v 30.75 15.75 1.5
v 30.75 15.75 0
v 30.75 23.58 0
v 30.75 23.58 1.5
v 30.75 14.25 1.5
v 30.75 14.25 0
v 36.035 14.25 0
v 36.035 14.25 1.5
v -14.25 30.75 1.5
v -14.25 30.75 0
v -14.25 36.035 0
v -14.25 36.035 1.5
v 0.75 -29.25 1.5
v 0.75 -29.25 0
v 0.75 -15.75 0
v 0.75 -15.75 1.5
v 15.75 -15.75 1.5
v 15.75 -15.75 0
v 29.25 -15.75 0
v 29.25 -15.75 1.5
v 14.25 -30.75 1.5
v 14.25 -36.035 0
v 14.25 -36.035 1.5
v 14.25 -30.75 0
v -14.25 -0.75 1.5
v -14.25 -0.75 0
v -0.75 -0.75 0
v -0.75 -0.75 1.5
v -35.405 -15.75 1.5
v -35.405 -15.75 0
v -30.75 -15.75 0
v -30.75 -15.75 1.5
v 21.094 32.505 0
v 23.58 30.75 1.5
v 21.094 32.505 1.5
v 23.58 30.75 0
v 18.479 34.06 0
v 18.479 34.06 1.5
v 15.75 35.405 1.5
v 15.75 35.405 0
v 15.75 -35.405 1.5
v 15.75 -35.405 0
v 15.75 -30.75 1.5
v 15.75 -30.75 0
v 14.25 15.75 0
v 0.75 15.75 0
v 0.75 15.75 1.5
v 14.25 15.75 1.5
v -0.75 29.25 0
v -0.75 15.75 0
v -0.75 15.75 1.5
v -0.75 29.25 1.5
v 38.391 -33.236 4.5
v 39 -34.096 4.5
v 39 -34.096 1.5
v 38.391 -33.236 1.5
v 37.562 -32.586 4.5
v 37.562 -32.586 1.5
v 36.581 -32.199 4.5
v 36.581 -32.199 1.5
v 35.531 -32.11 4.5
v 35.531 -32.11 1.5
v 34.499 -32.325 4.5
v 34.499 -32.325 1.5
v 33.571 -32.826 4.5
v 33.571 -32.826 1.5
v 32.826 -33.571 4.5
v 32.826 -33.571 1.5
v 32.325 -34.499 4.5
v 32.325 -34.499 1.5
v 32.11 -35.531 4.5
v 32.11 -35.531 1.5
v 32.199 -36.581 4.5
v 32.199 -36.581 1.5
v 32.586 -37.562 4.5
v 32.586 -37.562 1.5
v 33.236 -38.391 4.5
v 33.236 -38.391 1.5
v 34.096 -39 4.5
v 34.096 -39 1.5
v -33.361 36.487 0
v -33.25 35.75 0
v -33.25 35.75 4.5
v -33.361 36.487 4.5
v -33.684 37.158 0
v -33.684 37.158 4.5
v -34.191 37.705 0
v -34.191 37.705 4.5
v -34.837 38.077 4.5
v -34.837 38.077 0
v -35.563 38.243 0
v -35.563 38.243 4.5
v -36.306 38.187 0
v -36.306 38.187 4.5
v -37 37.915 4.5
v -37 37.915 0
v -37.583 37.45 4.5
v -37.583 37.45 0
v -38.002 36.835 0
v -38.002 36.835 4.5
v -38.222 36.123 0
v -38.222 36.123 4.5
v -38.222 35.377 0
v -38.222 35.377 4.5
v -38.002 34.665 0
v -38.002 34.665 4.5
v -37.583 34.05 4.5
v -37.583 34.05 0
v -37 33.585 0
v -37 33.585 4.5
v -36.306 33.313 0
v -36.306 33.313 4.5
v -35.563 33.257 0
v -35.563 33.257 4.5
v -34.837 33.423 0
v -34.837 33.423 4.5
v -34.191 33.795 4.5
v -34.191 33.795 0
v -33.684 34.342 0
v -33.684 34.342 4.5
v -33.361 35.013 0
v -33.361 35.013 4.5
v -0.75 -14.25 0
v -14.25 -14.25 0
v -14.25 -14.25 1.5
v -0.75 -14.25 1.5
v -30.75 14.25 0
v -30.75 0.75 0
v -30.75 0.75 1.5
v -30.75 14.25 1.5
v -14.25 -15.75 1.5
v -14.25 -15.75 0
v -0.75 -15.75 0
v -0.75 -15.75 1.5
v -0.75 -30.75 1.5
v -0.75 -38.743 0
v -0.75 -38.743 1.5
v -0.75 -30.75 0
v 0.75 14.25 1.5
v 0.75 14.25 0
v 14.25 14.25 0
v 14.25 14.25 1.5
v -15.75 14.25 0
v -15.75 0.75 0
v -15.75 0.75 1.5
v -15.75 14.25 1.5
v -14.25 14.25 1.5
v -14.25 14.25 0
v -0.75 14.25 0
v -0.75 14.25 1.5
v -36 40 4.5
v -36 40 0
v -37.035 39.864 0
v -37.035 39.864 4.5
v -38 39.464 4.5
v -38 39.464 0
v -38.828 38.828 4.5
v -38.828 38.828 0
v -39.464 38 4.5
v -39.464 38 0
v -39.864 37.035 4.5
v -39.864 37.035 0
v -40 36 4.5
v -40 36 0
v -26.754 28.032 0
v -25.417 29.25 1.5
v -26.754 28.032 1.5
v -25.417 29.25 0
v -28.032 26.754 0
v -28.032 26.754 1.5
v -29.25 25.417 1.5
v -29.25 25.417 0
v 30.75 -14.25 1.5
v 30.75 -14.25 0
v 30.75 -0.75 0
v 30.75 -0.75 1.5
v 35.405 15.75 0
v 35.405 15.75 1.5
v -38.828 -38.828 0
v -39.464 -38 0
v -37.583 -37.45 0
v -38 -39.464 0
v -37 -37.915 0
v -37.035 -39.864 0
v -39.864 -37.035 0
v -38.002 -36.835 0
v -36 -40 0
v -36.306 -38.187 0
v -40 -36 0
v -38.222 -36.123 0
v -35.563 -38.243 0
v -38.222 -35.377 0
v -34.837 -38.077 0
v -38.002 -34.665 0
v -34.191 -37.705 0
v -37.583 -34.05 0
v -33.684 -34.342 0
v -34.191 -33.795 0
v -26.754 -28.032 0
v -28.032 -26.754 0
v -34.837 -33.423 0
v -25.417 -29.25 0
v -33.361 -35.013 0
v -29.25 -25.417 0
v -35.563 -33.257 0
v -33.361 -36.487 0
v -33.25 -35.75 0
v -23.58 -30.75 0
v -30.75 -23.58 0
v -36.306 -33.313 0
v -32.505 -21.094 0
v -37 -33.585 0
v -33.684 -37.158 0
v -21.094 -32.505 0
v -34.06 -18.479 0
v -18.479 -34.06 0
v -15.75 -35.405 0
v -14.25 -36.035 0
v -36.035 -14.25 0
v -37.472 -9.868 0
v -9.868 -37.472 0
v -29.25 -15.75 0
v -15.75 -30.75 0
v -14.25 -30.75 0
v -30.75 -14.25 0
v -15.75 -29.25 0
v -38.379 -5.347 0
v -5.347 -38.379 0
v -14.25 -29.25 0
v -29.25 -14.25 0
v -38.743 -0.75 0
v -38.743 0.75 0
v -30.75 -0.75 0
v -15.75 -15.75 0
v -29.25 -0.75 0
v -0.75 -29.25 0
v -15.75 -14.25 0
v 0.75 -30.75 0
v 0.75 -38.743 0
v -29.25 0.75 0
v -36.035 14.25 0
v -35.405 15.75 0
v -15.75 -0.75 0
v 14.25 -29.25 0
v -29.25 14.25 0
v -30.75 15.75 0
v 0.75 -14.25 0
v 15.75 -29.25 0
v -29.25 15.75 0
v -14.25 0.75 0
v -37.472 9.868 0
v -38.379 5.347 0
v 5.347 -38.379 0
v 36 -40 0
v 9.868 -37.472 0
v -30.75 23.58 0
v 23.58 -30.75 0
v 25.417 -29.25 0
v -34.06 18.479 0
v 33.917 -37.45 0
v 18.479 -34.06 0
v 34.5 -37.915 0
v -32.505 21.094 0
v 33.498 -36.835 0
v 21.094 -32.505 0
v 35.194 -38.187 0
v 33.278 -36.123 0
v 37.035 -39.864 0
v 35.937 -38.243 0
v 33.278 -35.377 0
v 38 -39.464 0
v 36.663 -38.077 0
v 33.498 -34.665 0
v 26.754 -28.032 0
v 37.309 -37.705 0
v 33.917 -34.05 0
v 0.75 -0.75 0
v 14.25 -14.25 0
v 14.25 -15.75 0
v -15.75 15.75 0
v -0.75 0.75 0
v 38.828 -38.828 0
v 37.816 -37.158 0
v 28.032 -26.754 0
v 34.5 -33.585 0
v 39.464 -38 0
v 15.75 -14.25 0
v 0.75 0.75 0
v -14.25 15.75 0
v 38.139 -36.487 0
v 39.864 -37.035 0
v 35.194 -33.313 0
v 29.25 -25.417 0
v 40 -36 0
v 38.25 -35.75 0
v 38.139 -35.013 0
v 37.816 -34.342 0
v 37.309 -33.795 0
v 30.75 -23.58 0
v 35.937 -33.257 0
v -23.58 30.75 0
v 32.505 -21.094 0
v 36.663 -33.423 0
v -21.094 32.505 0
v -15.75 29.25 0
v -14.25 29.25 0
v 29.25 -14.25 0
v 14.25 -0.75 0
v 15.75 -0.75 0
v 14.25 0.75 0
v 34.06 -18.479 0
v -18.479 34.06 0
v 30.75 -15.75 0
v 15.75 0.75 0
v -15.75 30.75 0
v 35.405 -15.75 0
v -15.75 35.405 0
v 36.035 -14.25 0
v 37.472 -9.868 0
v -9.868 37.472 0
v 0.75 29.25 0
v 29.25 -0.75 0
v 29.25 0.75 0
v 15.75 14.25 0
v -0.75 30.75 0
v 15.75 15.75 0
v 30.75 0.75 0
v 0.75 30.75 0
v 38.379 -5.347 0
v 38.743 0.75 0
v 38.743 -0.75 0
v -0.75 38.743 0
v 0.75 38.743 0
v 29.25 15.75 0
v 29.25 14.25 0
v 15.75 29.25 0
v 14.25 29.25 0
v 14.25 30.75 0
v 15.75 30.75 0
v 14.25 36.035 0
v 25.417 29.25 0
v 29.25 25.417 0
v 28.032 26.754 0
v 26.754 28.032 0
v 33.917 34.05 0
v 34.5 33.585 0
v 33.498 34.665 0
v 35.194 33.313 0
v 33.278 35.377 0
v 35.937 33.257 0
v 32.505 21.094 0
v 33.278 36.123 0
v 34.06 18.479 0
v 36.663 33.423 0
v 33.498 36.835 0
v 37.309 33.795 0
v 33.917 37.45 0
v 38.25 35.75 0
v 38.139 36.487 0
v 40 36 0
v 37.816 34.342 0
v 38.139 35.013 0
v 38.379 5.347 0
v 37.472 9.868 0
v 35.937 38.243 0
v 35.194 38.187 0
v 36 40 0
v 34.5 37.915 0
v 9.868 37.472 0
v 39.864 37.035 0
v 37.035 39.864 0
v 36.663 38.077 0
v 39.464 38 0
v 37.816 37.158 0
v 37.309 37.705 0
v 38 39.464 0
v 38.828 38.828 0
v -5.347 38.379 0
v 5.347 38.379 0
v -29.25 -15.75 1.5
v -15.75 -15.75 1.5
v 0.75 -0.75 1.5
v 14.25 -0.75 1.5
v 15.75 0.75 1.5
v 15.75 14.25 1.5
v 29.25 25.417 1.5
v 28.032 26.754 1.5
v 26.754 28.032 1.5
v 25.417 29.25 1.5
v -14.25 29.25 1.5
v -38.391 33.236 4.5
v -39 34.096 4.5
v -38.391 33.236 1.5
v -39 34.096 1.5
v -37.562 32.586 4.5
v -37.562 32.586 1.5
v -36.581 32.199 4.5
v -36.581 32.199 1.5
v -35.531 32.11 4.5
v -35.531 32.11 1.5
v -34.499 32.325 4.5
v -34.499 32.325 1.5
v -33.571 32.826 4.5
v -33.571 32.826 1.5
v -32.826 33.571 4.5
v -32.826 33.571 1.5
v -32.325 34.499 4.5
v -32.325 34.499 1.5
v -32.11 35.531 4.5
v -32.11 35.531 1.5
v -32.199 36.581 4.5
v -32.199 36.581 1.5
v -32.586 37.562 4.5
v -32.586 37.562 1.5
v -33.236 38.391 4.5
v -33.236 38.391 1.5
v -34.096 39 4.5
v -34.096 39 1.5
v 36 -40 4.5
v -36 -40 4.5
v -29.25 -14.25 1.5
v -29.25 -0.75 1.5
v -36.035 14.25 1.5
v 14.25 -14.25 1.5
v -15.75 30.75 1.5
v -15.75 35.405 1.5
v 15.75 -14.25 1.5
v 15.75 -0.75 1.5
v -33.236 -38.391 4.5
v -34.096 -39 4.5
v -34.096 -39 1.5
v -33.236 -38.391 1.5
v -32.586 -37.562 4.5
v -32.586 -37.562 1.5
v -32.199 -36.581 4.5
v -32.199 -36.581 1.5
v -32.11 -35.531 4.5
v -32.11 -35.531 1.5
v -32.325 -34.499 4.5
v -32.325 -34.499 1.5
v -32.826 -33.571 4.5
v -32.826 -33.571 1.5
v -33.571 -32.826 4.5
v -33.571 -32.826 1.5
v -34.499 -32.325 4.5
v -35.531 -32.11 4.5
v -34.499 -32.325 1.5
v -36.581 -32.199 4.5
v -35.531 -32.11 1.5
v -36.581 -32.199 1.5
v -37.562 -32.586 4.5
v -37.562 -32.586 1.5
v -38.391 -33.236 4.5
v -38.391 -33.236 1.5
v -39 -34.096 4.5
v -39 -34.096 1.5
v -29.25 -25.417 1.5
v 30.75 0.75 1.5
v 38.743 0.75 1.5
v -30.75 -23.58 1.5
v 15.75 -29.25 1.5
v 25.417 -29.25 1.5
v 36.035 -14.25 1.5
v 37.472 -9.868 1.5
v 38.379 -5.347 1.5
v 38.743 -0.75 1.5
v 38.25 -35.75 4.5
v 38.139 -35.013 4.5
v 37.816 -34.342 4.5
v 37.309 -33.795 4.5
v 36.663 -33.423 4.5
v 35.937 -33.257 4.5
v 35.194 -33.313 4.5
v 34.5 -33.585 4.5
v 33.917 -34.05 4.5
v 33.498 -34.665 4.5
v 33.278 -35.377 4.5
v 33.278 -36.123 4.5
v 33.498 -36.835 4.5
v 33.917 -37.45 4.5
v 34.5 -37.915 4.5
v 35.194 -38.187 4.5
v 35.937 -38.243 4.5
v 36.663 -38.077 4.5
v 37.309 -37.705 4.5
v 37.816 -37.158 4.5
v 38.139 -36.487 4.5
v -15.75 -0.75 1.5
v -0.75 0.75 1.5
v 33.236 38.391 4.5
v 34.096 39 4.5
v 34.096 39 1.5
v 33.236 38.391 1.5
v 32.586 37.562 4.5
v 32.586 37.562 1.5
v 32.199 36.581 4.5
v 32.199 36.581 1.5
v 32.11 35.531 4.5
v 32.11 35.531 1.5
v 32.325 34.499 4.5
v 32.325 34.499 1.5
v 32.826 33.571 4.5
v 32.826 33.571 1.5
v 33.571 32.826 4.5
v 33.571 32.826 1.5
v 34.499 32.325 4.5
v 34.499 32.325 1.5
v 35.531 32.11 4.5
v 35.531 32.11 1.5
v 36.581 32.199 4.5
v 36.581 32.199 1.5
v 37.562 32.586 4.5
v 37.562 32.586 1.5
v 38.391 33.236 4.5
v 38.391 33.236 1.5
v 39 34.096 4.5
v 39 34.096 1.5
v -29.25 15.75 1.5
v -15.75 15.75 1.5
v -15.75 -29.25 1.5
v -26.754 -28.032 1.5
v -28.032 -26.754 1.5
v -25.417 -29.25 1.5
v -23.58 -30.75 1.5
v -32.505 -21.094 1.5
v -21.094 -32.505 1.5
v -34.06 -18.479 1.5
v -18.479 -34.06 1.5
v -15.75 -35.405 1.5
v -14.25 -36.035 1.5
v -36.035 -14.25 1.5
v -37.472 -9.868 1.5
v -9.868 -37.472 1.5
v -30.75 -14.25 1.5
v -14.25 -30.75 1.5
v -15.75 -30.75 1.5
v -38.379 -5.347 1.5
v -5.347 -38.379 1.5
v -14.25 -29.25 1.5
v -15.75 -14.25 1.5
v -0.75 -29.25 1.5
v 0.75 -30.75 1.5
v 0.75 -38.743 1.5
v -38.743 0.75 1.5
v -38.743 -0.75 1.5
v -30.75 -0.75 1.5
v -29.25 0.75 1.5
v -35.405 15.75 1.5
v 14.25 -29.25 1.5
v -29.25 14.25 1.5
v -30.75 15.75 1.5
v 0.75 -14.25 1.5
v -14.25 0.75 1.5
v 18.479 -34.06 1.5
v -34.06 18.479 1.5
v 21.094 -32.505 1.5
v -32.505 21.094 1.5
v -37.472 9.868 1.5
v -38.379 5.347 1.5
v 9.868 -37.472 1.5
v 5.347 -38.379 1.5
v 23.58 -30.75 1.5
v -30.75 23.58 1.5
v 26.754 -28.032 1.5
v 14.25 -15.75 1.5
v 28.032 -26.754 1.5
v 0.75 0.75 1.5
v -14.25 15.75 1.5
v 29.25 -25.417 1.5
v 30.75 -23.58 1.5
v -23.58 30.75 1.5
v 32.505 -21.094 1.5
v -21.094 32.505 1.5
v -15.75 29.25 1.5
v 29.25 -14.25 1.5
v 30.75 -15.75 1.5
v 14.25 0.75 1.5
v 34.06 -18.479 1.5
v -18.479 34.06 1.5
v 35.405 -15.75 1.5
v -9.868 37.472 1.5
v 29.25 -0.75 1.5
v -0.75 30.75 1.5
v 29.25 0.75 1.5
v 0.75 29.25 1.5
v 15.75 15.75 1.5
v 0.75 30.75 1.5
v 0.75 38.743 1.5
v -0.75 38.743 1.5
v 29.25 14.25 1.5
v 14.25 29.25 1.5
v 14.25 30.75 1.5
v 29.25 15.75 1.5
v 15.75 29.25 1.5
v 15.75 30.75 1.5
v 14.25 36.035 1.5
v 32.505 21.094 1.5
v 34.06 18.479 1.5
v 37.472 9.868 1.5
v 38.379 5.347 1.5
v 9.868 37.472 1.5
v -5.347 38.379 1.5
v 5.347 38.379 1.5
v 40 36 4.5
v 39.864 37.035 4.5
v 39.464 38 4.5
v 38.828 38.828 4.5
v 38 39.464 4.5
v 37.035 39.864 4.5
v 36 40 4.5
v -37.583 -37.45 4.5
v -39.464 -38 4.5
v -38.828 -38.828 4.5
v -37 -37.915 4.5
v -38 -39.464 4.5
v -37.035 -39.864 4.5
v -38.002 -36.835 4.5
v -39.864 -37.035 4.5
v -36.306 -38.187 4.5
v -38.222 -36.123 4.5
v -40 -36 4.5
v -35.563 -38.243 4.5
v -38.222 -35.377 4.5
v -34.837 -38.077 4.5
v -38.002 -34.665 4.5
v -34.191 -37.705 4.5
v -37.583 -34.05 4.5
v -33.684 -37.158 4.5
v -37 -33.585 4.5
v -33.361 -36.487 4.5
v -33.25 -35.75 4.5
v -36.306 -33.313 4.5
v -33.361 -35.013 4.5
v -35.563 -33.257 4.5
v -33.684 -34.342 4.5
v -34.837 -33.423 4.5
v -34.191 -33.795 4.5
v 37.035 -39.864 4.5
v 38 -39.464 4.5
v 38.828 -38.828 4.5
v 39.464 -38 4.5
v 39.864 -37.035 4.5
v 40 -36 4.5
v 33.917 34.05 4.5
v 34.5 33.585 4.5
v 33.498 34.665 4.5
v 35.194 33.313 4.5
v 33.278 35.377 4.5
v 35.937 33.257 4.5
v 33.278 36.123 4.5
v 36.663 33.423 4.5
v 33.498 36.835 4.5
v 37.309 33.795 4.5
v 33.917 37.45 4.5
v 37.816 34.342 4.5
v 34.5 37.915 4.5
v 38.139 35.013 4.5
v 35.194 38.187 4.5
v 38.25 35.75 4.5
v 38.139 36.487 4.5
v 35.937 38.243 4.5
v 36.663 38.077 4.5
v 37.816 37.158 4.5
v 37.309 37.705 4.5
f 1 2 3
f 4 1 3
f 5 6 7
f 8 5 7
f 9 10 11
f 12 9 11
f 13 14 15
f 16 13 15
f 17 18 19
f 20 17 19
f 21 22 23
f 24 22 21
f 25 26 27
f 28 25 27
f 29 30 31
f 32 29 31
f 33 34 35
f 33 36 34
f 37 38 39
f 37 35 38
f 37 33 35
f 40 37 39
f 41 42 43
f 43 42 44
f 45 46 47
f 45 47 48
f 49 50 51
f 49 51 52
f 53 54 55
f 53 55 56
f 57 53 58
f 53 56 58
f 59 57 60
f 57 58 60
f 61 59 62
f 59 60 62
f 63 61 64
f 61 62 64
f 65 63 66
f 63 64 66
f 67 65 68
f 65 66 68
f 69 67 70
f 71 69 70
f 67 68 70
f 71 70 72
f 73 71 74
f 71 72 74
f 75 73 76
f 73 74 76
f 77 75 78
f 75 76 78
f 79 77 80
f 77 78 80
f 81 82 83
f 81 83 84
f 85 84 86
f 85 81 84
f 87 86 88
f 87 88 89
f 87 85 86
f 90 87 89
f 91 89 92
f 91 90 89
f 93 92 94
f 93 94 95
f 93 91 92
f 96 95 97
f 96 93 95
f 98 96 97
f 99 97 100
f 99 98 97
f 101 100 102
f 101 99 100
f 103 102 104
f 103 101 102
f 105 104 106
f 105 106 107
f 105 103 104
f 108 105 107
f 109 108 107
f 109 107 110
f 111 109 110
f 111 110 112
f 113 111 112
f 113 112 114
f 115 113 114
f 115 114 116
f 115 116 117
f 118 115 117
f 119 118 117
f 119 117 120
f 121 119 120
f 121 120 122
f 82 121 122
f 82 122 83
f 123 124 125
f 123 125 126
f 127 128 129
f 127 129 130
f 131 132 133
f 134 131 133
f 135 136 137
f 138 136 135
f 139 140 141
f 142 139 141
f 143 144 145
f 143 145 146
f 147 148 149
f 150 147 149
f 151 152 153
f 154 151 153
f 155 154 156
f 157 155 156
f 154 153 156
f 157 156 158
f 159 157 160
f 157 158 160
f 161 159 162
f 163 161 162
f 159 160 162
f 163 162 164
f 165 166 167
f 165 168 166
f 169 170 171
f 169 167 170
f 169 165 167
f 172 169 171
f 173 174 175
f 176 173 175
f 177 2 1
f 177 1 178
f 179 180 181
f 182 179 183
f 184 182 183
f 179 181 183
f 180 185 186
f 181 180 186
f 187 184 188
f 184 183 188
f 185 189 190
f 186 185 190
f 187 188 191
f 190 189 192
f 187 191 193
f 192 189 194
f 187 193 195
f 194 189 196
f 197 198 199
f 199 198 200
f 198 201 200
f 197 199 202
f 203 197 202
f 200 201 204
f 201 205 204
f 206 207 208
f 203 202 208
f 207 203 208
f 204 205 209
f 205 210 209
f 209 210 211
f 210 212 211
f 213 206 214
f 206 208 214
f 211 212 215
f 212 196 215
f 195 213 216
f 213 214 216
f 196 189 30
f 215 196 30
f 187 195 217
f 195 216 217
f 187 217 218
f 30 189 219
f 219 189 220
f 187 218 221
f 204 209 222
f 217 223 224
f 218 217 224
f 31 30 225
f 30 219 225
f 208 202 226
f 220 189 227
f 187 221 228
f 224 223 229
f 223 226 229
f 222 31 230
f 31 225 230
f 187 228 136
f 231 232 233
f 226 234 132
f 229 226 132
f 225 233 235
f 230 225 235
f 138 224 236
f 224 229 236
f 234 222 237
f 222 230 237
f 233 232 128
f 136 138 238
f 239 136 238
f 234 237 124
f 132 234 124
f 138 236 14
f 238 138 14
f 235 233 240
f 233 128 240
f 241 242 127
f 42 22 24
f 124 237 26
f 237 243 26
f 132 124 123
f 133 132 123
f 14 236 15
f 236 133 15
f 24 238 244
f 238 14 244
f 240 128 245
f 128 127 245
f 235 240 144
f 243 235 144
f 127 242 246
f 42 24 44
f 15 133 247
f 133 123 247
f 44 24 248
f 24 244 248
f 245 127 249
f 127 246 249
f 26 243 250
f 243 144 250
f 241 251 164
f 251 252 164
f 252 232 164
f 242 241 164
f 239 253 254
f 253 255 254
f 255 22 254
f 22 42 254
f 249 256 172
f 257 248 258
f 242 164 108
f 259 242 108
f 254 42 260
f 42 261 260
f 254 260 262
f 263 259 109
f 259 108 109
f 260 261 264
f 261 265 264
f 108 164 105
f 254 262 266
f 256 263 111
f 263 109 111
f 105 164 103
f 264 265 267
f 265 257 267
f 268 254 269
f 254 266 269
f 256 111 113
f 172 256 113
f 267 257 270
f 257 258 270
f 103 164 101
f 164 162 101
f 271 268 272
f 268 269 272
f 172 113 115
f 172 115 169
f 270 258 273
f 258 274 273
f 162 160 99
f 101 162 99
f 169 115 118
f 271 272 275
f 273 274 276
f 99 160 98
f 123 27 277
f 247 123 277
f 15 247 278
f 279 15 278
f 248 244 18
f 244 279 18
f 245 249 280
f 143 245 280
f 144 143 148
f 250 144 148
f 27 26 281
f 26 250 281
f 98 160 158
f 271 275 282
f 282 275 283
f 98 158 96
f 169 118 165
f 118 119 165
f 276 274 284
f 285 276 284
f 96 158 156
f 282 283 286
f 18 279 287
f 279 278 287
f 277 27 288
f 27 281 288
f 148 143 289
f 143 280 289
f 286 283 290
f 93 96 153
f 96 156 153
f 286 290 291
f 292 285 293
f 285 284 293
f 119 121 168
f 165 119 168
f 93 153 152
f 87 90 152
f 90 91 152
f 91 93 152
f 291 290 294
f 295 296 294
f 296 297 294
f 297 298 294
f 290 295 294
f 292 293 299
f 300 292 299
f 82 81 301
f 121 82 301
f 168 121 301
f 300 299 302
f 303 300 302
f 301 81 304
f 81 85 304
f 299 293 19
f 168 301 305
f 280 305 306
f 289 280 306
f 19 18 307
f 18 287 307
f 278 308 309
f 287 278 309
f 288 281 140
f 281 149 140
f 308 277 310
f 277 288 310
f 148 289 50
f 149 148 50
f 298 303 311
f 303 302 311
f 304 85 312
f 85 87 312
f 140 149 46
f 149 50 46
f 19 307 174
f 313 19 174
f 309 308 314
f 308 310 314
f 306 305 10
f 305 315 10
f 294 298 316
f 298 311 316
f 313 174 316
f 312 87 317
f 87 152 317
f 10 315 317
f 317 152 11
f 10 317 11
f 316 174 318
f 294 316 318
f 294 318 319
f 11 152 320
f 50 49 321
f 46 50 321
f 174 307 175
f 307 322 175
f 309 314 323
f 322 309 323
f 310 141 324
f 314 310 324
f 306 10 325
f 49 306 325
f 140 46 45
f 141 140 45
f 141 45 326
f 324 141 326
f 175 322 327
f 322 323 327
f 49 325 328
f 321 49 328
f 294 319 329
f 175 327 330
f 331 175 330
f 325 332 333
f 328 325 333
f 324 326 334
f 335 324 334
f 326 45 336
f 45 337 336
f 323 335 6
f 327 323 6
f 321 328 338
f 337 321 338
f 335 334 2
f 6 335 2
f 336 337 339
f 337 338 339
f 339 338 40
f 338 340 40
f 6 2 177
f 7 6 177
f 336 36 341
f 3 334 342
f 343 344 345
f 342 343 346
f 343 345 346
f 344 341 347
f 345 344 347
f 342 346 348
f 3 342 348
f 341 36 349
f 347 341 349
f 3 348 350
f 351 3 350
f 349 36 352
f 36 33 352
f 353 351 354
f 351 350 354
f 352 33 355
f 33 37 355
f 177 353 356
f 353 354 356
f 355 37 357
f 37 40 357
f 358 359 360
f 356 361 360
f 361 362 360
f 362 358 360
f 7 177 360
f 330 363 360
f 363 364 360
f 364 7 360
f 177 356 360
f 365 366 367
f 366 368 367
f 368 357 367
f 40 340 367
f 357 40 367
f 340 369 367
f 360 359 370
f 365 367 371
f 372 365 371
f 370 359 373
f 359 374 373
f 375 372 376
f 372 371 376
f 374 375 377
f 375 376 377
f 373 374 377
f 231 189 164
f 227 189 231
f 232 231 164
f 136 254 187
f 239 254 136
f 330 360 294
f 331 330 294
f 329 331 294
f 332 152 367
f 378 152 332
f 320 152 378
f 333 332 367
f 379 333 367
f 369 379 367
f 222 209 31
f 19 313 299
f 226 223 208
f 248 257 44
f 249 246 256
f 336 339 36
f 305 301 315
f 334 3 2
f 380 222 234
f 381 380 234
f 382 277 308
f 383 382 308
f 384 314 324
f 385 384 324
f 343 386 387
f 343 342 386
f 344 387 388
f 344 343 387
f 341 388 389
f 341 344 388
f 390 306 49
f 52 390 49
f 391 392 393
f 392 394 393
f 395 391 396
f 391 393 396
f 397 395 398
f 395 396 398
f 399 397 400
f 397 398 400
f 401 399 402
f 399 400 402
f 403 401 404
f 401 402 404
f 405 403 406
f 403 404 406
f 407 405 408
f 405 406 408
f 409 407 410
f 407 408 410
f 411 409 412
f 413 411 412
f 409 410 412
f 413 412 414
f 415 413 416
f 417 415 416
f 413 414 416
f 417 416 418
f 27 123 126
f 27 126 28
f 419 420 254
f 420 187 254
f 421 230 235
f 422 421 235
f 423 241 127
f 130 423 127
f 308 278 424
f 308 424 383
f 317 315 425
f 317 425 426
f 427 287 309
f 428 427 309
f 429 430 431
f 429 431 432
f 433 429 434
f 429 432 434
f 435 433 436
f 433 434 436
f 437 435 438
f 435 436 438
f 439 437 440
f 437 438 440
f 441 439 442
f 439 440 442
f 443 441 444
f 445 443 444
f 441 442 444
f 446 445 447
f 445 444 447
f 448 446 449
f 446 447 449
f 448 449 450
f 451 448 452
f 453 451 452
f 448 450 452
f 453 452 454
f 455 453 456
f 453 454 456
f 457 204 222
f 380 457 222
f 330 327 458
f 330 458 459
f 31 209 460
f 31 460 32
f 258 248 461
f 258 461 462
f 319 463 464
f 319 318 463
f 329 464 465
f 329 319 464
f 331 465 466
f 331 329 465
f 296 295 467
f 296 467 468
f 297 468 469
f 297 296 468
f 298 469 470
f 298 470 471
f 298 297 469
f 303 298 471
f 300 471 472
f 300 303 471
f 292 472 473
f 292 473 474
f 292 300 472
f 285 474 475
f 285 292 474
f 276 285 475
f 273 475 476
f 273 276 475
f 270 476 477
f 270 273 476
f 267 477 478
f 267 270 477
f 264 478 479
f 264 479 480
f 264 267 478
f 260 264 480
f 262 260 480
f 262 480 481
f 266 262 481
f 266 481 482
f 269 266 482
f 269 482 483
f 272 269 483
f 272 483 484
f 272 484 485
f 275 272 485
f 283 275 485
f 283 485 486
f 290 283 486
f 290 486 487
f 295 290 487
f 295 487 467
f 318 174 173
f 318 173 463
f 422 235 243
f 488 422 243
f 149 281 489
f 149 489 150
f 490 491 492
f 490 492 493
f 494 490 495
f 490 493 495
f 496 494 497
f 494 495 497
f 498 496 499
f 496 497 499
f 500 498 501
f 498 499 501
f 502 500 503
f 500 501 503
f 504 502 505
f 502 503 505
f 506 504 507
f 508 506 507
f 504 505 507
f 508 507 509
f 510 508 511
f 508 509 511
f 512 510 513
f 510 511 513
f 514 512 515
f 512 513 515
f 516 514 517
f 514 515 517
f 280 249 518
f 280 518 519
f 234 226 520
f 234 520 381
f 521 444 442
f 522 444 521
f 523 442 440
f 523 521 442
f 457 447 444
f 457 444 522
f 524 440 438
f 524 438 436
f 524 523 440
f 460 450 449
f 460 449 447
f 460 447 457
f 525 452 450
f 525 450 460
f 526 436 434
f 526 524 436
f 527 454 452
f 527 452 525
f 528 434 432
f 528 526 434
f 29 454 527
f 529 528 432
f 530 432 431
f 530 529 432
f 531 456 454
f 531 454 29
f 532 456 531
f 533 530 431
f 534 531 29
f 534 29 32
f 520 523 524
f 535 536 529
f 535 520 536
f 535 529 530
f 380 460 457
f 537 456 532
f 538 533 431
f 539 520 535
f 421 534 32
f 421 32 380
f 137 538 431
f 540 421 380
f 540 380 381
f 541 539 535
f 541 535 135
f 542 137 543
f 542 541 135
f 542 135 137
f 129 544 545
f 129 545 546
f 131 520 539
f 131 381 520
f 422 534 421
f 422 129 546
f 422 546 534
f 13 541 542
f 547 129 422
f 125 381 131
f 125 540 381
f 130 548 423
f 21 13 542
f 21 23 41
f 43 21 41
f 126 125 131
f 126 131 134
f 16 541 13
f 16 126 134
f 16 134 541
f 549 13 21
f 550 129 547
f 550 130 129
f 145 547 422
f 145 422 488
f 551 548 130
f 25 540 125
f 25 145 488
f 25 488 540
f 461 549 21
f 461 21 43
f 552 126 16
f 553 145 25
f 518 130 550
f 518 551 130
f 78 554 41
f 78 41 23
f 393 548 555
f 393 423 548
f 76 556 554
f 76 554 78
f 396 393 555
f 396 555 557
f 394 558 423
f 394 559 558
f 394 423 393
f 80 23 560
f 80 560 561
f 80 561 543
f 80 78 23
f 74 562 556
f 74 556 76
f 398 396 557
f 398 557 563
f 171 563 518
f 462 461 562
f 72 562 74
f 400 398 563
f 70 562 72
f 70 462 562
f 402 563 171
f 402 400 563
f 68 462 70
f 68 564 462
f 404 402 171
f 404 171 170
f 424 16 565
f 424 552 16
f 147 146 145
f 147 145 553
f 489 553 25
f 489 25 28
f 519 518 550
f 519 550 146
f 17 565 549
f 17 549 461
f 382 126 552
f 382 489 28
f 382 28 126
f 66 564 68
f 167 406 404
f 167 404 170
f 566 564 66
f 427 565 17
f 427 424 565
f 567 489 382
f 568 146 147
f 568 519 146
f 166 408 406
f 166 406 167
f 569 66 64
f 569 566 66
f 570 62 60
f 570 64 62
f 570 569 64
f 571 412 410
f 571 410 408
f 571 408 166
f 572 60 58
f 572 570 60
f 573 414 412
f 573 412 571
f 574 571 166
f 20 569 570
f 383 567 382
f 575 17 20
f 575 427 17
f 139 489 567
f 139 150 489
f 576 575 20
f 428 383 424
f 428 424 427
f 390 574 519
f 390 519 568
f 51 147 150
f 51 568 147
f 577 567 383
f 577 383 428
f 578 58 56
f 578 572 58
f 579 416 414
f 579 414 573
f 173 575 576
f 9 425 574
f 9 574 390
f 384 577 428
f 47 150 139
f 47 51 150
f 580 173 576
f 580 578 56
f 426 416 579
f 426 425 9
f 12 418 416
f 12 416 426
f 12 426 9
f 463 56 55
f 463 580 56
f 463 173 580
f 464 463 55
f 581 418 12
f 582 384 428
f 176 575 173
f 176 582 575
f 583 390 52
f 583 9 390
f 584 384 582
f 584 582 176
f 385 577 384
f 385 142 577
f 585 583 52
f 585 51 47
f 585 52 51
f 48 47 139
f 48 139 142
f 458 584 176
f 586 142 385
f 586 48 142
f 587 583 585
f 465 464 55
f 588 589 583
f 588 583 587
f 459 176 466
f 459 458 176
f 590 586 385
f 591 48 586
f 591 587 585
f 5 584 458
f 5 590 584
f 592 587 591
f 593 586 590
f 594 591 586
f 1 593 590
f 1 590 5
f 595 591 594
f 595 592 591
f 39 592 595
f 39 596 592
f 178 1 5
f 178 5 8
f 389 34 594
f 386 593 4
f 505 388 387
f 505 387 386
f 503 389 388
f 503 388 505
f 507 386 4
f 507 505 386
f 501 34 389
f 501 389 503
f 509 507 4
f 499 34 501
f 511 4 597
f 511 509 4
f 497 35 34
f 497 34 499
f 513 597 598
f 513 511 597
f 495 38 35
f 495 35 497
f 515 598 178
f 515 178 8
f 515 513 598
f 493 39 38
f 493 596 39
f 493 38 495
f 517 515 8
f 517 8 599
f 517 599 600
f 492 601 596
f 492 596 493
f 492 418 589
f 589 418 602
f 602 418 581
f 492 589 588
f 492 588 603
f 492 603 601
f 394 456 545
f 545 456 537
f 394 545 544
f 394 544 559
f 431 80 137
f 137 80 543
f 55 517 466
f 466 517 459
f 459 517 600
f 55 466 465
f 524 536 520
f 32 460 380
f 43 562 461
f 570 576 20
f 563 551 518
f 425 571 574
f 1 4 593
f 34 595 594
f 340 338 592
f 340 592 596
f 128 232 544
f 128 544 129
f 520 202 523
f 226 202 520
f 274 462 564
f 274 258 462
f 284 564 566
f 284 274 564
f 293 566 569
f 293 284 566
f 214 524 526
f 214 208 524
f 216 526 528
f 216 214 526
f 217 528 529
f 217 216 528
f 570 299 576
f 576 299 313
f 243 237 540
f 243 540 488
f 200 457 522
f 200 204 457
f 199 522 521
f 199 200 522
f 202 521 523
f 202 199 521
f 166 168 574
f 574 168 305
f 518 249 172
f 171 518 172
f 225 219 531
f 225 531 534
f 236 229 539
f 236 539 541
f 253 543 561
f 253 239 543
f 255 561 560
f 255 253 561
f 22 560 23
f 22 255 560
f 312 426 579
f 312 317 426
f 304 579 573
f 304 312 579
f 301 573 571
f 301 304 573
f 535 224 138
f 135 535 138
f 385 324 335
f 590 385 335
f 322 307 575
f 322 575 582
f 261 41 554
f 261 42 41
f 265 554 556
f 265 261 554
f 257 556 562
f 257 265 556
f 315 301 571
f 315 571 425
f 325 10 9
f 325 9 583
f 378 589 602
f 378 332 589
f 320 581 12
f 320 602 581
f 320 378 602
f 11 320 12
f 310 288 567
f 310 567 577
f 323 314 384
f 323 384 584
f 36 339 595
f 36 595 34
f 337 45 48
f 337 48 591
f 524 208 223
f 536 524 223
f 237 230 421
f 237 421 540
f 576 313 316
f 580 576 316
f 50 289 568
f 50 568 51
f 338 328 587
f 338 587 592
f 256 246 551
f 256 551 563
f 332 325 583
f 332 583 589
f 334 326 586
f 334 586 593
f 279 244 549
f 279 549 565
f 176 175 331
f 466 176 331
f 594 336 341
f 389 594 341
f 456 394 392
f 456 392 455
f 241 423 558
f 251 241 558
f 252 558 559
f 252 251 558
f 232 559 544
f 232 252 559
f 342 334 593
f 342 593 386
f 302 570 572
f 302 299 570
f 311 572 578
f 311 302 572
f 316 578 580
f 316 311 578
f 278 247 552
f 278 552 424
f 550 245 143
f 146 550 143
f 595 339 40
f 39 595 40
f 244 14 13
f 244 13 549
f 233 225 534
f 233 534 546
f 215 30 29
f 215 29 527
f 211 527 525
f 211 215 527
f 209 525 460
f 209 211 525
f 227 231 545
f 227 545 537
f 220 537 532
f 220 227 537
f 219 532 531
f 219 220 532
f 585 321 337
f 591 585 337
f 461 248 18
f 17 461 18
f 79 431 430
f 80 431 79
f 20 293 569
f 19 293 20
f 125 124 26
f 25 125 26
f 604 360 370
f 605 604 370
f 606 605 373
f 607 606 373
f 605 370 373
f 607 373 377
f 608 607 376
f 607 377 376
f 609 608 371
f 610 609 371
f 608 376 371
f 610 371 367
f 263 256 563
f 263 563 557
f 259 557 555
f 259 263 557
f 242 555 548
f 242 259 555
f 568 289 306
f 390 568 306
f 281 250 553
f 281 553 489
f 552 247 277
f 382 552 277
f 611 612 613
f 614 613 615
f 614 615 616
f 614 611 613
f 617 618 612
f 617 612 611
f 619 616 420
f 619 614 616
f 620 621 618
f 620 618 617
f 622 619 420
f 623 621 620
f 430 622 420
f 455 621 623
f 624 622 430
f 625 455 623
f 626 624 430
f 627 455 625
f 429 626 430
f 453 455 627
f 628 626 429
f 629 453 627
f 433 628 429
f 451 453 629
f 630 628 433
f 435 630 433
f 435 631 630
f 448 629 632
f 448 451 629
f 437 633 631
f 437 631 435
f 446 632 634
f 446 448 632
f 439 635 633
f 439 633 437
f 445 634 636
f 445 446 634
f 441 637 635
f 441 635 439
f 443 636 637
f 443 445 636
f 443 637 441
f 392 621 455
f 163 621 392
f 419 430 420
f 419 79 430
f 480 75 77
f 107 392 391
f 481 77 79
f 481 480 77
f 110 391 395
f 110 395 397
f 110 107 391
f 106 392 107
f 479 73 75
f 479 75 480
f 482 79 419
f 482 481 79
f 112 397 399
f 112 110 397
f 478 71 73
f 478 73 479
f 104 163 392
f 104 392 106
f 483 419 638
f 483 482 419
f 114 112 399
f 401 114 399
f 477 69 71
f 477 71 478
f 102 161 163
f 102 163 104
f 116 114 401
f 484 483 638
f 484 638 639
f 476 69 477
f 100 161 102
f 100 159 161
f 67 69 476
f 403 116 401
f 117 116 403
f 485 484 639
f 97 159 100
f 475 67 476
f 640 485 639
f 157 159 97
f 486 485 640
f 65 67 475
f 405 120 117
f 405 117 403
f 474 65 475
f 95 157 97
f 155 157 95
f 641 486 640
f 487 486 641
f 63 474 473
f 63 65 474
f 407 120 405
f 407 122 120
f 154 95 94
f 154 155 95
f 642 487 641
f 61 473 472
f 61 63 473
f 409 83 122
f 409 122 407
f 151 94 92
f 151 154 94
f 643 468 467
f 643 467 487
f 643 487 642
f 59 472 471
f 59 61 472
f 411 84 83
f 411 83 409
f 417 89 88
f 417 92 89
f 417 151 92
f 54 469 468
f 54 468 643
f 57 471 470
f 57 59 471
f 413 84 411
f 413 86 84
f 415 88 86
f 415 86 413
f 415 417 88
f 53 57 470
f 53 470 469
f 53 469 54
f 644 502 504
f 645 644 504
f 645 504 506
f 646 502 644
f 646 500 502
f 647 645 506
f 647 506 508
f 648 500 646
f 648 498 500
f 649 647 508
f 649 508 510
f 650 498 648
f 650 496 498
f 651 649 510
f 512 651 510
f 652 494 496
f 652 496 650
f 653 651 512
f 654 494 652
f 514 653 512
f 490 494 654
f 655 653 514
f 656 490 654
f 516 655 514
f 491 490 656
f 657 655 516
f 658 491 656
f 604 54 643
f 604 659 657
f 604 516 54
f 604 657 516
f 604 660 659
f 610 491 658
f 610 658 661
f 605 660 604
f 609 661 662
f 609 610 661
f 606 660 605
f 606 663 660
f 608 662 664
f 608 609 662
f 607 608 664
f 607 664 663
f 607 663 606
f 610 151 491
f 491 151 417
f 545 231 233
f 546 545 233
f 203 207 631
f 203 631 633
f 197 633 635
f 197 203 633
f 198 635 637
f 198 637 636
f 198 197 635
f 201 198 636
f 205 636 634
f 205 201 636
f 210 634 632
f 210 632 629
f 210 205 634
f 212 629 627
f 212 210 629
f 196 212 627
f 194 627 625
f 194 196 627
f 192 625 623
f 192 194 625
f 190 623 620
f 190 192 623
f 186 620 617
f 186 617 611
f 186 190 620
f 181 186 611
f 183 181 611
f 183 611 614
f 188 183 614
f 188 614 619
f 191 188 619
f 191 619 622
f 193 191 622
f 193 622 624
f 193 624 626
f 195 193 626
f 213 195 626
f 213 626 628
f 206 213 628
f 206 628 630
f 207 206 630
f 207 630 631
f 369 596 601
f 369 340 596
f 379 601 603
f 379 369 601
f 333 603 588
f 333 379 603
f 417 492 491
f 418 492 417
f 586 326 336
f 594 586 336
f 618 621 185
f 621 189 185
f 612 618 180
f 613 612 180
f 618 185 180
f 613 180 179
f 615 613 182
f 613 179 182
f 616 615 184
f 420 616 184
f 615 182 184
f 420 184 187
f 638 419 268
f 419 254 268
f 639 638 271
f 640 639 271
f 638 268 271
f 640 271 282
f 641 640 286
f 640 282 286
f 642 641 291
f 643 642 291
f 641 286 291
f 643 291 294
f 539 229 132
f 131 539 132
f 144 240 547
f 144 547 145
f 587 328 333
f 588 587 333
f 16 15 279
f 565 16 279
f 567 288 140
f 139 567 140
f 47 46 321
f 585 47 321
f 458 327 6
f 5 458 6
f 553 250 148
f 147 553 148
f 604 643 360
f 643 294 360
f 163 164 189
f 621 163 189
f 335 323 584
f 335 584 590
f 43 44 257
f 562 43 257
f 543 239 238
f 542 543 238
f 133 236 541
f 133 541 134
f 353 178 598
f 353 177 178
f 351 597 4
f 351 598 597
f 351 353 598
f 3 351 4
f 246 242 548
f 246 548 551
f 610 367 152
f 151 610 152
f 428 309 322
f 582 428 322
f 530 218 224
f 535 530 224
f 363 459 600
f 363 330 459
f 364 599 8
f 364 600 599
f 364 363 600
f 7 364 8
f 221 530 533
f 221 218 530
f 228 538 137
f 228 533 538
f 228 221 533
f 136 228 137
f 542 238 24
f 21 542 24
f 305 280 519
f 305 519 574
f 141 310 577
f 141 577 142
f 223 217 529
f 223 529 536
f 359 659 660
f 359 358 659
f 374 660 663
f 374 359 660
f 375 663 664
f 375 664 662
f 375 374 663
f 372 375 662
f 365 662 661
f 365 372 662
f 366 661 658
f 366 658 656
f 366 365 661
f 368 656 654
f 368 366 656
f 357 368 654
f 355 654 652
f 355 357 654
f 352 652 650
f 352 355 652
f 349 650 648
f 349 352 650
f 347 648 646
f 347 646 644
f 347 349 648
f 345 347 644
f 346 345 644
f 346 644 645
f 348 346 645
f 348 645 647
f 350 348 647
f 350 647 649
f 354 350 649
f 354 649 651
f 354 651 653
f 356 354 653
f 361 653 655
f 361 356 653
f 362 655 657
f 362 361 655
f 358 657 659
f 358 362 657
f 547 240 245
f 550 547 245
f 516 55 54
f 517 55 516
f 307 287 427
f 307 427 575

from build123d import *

# Parameters (mm, degrees)
SKETCH006_R            = 2.5
SKETCH006_R_2          = 38.75
PAD004_DEPTH           = 1.5
SKETCH007_W            = 1.5
SKETCH007_H            = 80
PAD005_DEPTH           = 1.5
LINEARPATTERN002_COUNT = 5
LINEARPATTERN002_PITCH = 15
SKETCH008_W            = 80
SKETCH008_H            = 1.5
PAD006_DEPTH           = 1.5
LINEARPATTERN003_COUNT = 5
LINEARPATTERN003_PITCH = 15
PAD007_DEPTH           = 3
SKETCH033_R            = 3.646447
SKETCH033_R_2          = 2.5
PAD017_DEPTH           = 3


with BuildPart() as part:
    # Sketch006 → Pad004 (new body)
    with BuildSketch(Plane.XY):
        with BuildLine():
            Line((40, -36), (40, 36))
            ThreePointArc((40, 36), (38.828427, 38.828427), (36, 40))
            Line((36, 40), (-36, 40))
            ThreePointArc((-36, 40), (-38.828427, 38.828427), (-40, 36))
            Line((-40, 36), (-40, -36))
            ThreePointArc((-40, -36), (-38.828427, -38.828427), (-36, -40))
            Line((-36, -40), (36, -40))
            ThreePointArc((36, -40), (38.828427, -38.828427), (40, -36))
        make_face()
        with Locations((-35.75, 35.75)):
            Circle(SKETCH006_R, mode=Mode.SUBTRACT)
        with Locations((35.75, 35.75)):
            Circle(SKETCH006_R, mode=Mode.SUBTRACT)
        with Locations((35.75, -35.75)):
            Circle(SKETCH006_R, mode=Mode.SUBTRACT)
        with Locations((-35.75, -35.75)):
            Circle(SKETCH006_R, mode=Mode.SUBTRACT)
        Circle(SKETCH006_R_2, mode=Mode.SUBTRACT)
    extrude(amount=PAD004_DEPTH)

    # Sketch007 → Pad005 (join)
    with BuildSketch(Plane.XY):
        with Locations((-30, 0)):
            Rectangle(SKETCH007_W, SKETCH007_H)
    pad005 = extrude(amount=PAD005_DEPTH)

    # LinearPattern002: Pad005 ×5
    with Locations(*[(i * LINEARPATTERN002_PITCH, 0, 0) for i in range(1, LINEARPATTERN002_COUNT)]):
        add(pad005)

    # Sketch008 → Pad006 (join)
    with BuildSketch(Plane.XY):
        with Locations((0, -30)):
            Rectangle(SKETCH008_W, SKETCH008_H)
    pad006 = extrude(amount=PAD006_DEPTH)

    # LinearPattern003: Pad006 ×5
    with Locations(*[(0, i * LINEARPATTERN003_PITCH, 0) for i in range(1, LINEARPATTERN003_COUNT)]):
        add(pad006)

    # Sketch009 (on Face137 of LinearPattern003) → Pad007 (join)
    with BuildSketch(Plane.XY.offset(1.5)):
        with BuildLine():
            Line((-40, 36), (-40, -36))
            ThreePointArc((-40, -36), (-38.828427, -38.828427), (-36, -40))
            Line((-36, -40), (36, -40))
            ThreePointArc((36, -40), (38.828427, -38.828427), (40, -36))
            Line((40, -36), (40, 36))
            ThreePointArc((40, 36), (38.828427, 38.828427), (36, 40))
            Line((36, 40), (-36, 40))
            ThreePointArc((-36, 40), (-38.828427, 38.828427), (-40, 36))
        make_face()
        with BuildLine():
            Line((-39, 36), (-39, -36))
            ThreePointArc((-39, -36), (-38.12132, -38.12132), (-36, -39))
            Line((-36, -39), (36, -39))
            ThreePointArc((36, -39), (38.12132, -38.12132), (39, -36))
            Line((39, -36), (39, 36))
            ThreePointArc((39, 36), (38.12132, 38.12132), (36, 39))
            Line((36, 39), (-36, 39))
            ThreePointArc((-36, 39), (-38.12132, 38.12132), (-39, 36))
        make_face(mode=Mode.SUBTRACT)
    extrude(amount=PAD007_DEPTH)

    # Sketch033 (on Face130 of Pad007) → Pad017 (join)
    with BuildSketch(Plane.XY.offset(1.5)):
        with Locations((35.75, 35.75)):
            Circle(SKETCH033_R)
        with Locations((35.75, 35.75)):
            Circle(SKETCH033_R_2, mode=Mode.SUBTRACT)
        with Locations((-35.75, 35.75)):
            Circle(SKETCH033_R)
        with Locations((-35.75, 35.75)):
            Circle(SKETCH033_R_2, mode=Mode.SUBTRACT)
        with Locations((-35.75, -35.75)):
            Circle(SKETCH033_R)
        with Locations((-35.75, -35.75)):
            Circle(SKETCH033_R_2, mode=Mode.SUBTRACT)
        with Locations((35.75, -35.75)):
            Circle(SKETCH033_R)
        with Locations((35.75, -35.75)):
            Circle(SKETCH033_R_2, mode=Mode.SUBTRACT)
    extrude(amount=PAD017_DEPTH)


solid = part.part
